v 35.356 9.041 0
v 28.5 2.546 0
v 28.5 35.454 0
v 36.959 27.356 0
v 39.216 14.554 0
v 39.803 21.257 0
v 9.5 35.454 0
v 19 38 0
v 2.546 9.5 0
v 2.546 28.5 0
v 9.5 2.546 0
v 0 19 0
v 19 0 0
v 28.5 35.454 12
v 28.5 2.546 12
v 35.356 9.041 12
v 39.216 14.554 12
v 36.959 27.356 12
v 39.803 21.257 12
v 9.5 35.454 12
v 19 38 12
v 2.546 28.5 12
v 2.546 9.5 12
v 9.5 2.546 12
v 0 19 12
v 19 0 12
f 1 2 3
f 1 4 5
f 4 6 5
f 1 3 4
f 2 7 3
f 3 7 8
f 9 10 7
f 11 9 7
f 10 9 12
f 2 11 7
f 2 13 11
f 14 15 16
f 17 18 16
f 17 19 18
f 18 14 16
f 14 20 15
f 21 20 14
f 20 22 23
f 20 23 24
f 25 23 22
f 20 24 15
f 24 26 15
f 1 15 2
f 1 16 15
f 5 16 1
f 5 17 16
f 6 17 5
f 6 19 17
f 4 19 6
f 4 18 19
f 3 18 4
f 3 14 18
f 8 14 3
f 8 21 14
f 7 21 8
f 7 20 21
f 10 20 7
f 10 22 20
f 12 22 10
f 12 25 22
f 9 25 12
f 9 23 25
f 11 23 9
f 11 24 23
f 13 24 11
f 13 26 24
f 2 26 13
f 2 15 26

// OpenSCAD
$fn = 32;

// ----------------------------------------------------------------------
// Eccentric disc: egg, 12 mm thick
// ----------------------------------------------------------------------

// --- parameters (mm) ---
profile_height = 12;      // extrusion height
profile_points = 13;      // points of the closed outline

profile = [[0, 19], [2.546, 9.5], [9.5, 2.546], [19, 0], [28.5, 2.546], [35.356, 9.041], [39.216, 14.554], [39.803, 21.257], [36.959, 27.356], [28.5, 35.454], [19, 38], [9.5, 35.454], [2.546, 28.5]];  // single closed polygon, 13 points, counter clockwise

// --- the one profile operation ---
linear_extrude(height = profile_height) polygon(points = profile);
